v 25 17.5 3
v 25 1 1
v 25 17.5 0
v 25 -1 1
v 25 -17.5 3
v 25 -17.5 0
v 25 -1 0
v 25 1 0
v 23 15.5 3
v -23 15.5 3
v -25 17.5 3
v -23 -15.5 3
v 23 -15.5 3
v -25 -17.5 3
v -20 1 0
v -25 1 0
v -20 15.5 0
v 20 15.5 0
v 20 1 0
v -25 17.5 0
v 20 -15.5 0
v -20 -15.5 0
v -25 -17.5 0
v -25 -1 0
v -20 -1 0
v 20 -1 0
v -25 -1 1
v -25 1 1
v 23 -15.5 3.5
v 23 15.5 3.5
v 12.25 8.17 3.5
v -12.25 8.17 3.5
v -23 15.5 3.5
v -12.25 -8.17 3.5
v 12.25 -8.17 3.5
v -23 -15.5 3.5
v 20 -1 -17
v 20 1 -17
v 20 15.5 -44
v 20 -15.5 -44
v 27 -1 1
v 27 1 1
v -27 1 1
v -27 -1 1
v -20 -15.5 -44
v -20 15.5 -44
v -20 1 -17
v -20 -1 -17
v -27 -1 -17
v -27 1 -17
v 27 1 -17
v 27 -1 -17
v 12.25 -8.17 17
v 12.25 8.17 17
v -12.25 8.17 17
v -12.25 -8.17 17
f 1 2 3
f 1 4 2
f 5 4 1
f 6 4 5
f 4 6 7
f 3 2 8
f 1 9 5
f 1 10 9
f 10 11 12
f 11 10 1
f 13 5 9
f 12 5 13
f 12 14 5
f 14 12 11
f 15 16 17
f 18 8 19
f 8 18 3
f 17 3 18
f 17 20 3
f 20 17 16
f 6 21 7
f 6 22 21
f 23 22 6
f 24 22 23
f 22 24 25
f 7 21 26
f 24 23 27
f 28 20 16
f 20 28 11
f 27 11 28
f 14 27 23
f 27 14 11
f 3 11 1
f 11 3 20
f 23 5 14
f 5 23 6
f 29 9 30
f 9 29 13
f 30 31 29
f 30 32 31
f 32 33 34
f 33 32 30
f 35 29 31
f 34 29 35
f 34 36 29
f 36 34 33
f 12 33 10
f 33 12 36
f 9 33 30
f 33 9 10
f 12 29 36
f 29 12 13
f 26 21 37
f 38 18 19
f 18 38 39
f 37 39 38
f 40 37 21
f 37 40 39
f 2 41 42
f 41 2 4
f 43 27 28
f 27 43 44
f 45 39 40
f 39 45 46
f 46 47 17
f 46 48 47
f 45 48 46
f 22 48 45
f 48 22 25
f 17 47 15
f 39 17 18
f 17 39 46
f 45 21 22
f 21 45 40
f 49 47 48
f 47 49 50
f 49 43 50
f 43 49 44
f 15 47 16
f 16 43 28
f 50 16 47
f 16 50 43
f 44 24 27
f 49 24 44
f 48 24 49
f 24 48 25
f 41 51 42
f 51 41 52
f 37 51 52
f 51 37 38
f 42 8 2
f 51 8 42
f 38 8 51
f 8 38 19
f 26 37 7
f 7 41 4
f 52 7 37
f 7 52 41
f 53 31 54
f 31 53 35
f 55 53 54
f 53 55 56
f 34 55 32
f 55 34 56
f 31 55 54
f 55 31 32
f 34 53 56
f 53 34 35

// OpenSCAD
// Parameters
cutout_width_mm = 36; //[18:72:0.1]
cutout_height_mm = 27; //[13.5:54:0.1]
cutout_clearance_mm = 0.2; //[0:1:0.05]
hole_clearance_mm = 0.2; //[0:1:0.05]
panel_thickness_mm = 2; //[1:6:0.1]
flange_width_mm = 50; //[30:100:0.1]
flange_height_mm = 35; //[20:70:0.1]
flange_thickness_mm = 3; //[1.5:8:0.1]
bezel_thickness_mm = 1.5; //[0.8:5:0.1]
bezel_inset_mm = 2; //[0.5:6:0.1]
body_wall_mm = 2; //[1:5:0.1]
body_depth_mm = 45; //[25:90:0.5]
front_face_recess_mm = 2; //[0:6:0.1]
socket_opening_width_mm = 24.5; //[18:35:0.1]
socket_opening_height_mm = 16.34; //[12:25:0.1]
socket_opening_depth_mm = 17; //[10:30:0.5]
fuse_drawer_width_mm = 20; //[12:35:0.1]
fuse_drawer_height_mm = 8; //[5:15:0.1]
fuse_drawer_offset_y_mm = 10; //[0:20:0.1]
clip_width_mm = 8; //[4:16:0.1]
clip_thickness_mm = 2; //[1:5:0.1]
clip_length_mm = 18; //[10:35:0.5]
spade_width_mm = 6.3; //[4.8:9.5:0.1]
spade_thickness_mm = 0.8; //[0.5:2:0.05]
spade_length_mm = 12; //[6:25:0.5]
spade_spacing_x_mm = 14; //[10:20:0.1]
spade_row_offset_y_mm = -6; //[-15:5:0.1]
spade_depth_from_back_mm = 2; //[0:10:0.1]
overlap_mm = 1; //[0.5:2:0.1]

// IEC Inlet Module
module iec() {
  color("Black") {
    // Front flange with bezel
    union() {
      translate([0, 0, flange_thickness_mm / 2])
        cube([flange_width_mm, flange_height_mm, flange_thickness_mm], center=true);
      translate([0, 0, flange_thickness_mm + bezel_thickness_mm / 2 - overlap_mm])
        cube([flange_width_mm - 2 * bezel_inset_mm, flange_height_mm - 2 * bezel_inset_mm, bezel_thickness_mm], center=true);
    }
    
    // IEC inlet body with clips
    union() {
      translate([0, 0, -body_depth_mm / 2 + overlap_mm])
        cube([cutout_width_mm + 2 * body_wall_mm, cutout_height_mm + 2 * body_wall_mm, body_depth_mm], center=true);
      translate([-(cutout_width_mm + 2 * body_wall_mm) / 2 - clip_width_mm / 2 + overlap_mm, 0, -clip_length_mm / 2 + overlap_mm])
        cube([clip_width_mm, clip_thickness_mm, clip_length_mm], center=true);
      translate([(cutout_width_mm + 2 * body_wall_mm) / 2 + clip_width_mm / 2 - overlap_mm, 0, -clip_length_mm / 2 + overlap_mm])
        cube([clip_width_mm, clip_thickness_mm, clip_length_mm], center=true);
    }
    
    // Socket opening and fuse drawer access
    difference() {
      translate([0, 0, (socket_opening_depth_mm) / 2 - overlap_mm / 2])
        cube([socket_opening_width_mm, socket_opening_height_mm, socket_opening_depth_mm + overlap_mm], center=true);
      translate([0, fuse_drawer_offset_y_mm, front_face_recess_mm / 2 - overlap_mm / 2])
        cube([fuse_drawer_width_mm, fuse_drawer_height_mm, front_face_recess_mm + overlap_mm], center=true);
    }
  }
}

// Mod Module
module mod() {
  color("DimGray") {
    // Terminal spade positions
    union() {
      translate([-spade_spacing_x_mm / 2, spade_row_offset_y_mm, -body_depth_mm + spade_length_mm / 2 + spade_depth_from_back_mm - overlap_mm])
        cube([spade_width_mm, spade_thickness_mm, spade_length_mm], center=true);
      translate([spade_spacing_x_mm / 2, spade_row_offset_y_mm, -body_depth_mm + spade_length_mm / 2 + spade_depth_from_back_mm - overlap_mm])
        cube([spade_width_mm, spade_thickness_mm, spade_length_mm], center=true);
      translate([0, spade_row_offset_y_mm + (socket_opening_height_mm / 2 - spade_thickness_mm / 2), -body_depth_mm + spade_length_mm / 2 + spade_depth_from_back_mm - overlap_mm])
        cube([spade_width_mm, spade_thickness_mm, spade_length_mm], center=true);
    }
    
    // Rear body depth envelope
    translate([0, 0, -body_depth_mm / 2 + overlap_mm])
      cube([cutout_width_mm + 2 * body_wall_mm, cutout_height_mm + 2 * body_wall_mm, body_depth_mm], center=true);
  }
}

// Assembly
module assembly() {
  iec();
  mod();
}

assembly();
